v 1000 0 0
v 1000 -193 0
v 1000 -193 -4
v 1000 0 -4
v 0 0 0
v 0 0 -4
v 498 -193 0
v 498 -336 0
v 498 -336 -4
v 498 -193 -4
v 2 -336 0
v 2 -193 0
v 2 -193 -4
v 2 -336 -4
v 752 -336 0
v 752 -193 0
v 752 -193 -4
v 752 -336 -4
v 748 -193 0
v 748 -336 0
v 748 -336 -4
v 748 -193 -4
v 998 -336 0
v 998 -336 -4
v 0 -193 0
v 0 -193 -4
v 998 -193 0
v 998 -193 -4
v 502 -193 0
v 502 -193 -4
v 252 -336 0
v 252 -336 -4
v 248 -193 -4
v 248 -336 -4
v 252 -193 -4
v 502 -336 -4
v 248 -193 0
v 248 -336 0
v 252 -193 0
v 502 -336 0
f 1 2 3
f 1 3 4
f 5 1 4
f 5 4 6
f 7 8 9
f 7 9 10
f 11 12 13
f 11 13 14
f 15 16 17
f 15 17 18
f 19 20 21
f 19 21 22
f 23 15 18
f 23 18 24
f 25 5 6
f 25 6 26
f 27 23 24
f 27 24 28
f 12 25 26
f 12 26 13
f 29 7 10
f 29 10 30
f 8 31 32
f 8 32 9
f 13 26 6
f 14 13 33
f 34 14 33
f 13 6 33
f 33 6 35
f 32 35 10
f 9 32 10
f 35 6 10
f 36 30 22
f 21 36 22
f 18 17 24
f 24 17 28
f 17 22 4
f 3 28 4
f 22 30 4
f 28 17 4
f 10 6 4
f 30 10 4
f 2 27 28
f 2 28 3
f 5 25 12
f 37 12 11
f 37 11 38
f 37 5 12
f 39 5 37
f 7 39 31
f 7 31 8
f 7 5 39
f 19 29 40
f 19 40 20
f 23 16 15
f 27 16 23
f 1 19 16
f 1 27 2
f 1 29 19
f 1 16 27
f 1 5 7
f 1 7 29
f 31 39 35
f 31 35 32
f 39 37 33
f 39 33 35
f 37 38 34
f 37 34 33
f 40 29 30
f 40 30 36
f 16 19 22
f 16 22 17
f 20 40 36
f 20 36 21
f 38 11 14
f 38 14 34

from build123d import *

# Parameters (mm, degrees)
F1_DEPTH = 4


with BuildPart() as f1:
    # F0 (on Top) → F1 (new body)
    with BuildSketch(Plane.XY):
        Polygon((1000, 0), (0, 0), (0, -193), (2, -193), (2, -336), (248, -336), (248, -193), (250, -193), (252, -193), (252, -336), (498, -336), (498, -193), (500, -193), (502, -193), (502, -336), (748, -336), (748, -193), (750, -193), (752, -193), (752, -336), (998, -336), (998, -193), (1000, -193), align=None)
    extrude(amount=-F1_DEPTH)


solid = f1.part
